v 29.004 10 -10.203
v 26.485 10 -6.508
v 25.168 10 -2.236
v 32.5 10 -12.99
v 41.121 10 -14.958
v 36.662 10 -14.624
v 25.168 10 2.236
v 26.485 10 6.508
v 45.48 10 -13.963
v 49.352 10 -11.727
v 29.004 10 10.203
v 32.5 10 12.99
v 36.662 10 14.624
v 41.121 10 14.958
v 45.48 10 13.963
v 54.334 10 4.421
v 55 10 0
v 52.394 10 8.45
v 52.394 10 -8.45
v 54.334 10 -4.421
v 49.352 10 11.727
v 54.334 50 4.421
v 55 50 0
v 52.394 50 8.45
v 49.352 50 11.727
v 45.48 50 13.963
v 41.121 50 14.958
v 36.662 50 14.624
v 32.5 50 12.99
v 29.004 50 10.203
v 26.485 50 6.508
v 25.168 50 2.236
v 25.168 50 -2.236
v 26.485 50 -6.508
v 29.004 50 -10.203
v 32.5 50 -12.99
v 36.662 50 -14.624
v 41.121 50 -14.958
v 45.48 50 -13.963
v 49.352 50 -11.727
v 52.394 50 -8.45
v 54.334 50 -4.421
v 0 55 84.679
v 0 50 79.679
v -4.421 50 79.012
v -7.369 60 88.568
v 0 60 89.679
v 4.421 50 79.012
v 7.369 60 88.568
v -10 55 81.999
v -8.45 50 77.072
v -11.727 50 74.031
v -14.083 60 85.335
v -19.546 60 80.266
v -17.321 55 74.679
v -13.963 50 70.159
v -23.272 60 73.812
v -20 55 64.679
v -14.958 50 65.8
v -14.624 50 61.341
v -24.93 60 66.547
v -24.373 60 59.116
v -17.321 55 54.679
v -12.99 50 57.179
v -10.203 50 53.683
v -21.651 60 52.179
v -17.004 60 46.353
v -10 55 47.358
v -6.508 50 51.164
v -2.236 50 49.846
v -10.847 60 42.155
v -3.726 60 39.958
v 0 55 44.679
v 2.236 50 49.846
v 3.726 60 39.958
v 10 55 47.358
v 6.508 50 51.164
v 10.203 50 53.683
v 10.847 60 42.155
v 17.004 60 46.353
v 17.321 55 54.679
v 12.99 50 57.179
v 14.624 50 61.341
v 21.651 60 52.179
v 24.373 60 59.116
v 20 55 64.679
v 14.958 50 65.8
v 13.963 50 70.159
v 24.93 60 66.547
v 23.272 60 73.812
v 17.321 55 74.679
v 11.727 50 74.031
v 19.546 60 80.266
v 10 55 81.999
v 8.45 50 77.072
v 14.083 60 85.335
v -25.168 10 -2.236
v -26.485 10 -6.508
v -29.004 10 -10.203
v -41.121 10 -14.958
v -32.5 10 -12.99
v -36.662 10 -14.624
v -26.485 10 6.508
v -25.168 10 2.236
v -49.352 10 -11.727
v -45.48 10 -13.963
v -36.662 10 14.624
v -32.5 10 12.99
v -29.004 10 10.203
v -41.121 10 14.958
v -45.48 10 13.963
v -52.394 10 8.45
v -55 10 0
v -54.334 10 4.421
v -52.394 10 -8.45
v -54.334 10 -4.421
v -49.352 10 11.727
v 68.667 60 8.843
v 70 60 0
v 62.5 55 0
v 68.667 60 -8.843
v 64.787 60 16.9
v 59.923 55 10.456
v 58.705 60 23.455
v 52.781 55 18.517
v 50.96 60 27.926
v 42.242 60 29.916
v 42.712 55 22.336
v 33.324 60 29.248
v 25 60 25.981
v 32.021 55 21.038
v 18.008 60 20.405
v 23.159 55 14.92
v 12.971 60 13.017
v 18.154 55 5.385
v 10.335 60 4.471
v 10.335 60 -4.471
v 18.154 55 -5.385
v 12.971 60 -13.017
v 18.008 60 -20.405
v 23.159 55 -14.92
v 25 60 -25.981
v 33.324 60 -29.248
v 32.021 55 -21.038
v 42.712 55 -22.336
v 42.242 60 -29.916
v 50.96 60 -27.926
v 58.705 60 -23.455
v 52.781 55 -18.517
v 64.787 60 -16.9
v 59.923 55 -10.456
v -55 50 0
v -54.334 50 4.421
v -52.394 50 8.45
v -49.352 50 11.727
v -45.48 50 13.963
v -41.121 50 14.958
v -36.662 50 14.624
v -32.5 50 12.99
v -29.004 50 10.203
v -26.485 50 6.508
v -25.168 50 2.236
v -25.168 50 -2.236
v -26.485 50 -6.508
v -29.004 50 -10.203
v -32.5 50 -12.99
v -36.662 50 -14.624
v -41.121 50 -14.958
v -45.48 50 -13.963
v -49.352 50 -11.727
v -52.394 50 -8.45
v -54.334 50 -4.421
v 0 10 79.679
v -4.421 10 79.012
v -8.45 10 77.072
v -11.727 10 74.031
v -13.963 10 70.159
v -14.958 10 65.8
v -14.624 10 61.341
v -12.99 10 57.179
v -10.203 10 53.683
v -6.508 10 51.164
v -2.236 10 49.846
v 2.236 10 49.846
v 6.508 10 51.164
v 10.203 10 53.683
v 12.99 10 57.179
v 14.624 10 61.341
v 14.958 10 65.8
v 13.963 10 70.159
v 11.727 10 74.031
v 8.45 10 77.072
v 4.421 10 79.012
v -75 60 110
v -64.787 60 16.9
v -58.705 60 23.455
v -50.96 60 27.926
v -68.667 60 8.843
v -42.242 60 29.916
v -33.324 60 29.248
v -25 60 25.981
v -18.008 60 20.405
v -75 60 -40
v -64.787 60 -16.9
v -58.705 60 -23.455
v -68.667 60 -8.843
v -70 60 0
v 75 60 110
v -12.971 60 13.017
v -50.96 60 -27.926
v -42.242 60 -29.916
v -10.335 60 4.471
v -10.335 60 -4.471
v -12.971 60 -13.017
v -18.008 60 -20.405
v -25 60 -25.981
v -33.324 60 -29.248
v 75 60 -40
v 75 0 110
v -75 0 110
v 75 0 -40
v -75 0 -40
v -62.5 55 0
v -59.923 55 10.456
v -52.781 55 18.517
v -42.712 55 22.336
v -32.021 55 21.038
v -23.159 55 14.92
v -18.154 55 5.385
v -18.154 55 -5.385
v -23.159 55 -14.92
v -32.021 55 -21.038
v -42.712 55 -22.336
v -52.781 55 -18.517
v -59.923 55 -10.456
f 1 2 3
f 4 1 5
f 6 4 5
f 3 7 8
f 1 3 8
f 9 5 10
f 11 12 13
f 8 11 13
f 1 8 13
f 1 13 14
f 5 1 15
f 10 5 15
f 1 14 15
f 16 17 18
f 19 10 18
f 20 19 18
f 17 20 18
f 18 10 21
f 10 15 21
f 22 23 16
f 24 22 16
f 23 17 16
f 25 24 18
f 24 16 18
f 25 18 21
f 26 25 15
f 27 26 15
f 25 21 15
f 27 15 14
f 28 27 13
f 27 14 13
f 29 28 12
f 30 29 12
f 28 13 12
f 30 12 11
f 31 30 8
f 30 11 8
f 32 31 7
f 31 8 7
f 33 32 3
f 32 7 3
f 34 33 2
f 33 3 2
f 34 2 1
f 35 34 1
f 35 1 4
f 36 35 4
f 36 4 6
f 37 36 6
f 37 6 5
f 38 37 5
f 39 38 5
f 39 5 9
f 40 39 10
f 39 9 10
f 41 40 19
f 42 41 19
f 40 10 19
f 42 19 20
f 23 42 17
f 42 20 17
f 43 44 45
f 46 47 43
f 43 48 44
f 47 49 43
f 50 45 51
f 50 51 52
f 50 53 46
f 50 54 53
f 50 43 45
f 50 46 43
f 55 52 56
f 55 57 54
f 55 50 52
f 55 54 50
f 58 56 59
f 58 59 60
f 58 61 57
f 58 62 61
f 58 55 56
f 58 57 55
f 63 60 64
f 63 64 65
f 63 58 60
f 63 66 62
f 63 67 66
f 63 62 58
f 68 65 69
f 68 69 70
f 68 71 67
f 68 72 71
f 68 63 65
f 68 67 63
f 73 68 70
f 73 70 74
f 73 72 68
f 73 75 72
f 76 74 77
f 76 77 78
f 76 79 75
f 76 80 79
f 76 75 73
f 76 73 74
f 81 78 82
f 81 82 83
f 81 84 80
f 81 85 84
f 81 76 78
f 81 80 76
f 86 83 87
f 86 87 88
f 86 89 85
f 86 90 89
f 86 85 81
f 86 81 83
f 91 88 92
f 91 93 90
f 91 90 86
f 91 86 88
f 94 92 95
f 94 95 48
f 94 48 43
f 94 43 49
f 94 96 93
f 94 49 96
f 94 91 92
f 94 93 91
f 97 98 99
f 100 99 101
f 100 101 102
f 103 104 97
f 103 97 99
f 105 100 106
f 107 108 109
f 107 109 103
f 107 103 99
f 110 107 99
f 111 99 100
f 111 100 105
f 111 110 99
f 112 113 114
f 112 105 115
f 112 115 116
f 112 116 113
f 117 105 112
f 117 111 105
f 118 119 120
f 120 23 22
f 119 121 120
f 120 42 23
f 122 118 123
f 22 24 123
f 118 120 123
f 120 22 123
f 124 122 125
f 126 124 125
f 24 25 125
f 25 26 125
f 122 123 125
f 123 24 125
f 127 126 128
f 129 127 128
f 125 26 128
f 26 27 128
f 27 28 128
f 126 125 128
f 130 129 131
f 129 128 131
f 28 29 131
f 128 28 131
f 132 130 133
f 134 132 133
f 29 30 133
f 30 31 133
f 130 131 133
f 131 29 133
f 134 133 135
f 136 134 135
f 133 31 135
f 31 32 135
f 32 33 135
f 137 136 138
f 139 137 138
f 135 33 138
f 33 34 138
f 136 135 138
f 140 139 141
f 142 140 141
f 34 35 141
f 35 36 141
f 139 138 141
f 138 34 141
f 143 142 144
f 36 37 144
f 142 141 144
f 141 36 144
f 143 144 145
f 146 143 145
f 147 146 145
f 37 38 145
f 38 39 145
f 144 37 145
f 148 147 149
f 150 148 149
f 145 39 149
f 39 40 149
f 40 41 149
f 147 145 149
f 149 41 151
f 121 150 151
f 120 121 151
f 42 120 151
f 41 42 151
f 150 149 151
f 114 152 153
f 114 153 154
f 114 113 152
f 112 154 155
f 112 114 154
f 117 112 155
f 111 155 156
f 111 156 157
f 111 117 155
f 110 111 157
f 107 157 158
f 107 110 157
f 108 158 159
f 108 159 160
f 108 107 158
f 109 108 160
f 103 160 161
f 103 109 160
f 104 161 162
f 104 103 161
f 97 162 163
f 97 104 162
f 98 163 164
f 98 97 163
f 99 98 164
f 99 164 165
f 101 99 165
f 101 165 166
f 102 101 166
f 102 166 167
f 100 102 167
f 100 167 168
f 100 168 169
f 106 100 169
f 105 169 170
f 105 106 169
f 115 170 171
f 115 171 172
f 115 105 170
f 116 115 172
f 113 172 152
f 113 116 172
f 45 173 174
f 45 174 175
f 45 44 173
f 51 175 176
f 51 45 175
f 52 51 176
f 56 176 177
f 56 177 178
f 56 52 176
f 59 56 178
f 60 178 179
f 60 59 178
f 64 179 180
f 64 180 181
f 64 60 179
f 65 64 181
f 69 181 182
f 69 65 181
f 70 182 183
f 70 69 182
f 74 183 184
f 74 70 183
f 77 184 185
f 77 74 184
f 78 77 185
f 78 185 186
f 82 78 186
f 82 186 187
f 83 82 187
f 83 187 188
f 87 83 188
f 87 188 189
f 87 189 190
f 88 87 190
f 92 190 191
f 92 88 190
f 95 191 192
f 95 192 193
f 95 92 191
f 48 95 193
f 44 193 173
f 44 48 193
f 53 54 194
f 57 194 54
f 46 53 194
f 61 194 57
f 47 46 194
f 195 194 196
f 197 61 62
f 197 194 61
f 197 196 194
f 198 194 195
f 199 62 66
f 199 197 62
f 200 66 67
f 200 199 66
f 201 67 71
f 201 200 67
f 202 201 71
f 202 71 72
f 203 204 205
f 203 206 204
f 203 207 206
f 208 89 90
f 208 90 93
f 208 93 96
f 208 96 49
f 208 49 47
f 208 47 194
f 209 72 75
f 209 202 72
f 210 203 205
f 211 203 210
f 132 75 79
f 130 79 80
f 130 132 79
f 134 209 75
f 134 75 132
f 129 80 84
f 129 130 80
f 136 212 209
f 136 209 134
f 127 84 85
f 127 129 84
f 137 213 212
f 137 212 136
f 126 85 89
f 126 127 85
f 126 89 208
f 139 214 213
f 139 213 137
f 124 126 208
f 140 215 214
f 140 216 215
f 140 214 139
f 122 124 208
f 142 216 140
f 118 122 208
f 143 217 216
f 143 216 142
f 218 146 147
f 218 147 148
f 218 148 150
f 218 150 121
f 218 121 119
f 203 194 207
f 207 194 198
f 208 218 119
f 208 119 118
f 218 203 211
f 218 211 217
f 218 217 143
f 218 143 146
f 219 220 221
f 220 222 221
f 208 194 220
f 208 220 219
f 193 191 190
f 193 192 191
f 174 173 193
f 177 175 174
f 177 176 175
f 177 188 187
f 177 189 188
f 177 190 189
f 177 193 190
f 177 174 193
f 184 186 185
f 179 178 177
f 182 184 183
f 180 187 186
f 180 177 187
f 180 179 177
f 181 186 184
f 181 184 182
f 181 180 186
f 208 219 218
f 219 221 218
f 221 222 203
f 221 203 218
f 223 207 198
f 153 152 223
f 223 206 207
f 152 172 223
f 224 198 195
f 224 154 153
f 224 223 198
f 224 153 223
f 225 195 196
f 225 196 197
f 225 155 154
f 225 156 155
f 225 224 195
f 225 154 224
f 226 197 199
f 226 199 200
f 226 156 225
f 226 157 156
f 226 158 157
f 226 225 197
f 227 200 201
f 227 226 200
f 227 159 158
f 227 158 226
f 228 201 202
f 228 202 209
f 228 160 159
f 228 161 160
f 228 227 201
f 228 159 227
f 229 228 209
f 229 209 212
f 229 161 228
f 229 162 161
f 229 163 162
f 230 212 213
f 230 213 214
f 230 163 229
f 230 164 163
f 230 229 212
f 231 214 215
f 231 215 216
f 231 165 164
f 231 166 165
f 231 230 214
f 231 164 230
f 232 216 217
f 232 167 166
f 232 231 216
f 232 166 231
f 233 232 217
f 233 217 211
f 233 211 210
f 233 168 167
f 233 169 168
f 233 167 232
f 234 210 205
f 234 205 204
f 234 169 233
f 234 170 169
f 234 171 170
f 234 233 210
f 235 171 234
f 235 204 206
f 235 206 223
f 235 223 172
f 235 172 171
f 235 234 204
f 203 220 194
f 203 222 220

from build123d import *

# Parameters (mm, degrees)
SKETCH1_W           = 150
SKETCH1_H           = 80
BOSS_EXTRUDE1_DEPTH = 60
SKETCH3_W           = 150
SKETCH3_H           = 60
BOSS_EXTRUDE2_DEPTH = 70


with BuildPart() as part:
    # Sketch1 → Boss-Extrude1 (new body)
    with BuildSketch(Plane(origin=(0, 0, 0), x_dir=(1, 0, 0), z_dir=(0, 1, 0))):
        Rectangle(SKETCH1_W, SKETCH1_H)
    extrude(amount=BOSS_EXTRUDE1_DEPTH)

    # Sketch2 → Cut-Revolve1 (revolve, cut)
    with BuildSketch(Plane.XY):
        Polygon((-40, 60), (-70, 60), (-55, 50), (-55, 10), (-40, 10), align=None)
    cut_revolve1 = revolve(axis=Axis((-40, 10, 0), (0, 1, 0)), mode=Mode.SUBTRACT)

    # Mirror1: Cut-Revolve1 across plane
    add(cut_revolve1.mirror(Plane(origin=(0, 0, 0), x_dir=(0, 0, 1), z_dir=(1, 0, 0))), mode=Mode.SUBTRACT)

    # Sketch3 → Boss-Extrude2 (add)
    with BuildSketch(Plane.XY.offset(40)):
        with Locations((0, 30)):
            Rectangle(SKETCH3_W, SKETCH3_H)
    extrude(amount=BOSS_EXTRUDE2_DEPTH)

    # Sketch6 → Cut-Revolve2 (revolve, cut)
    with BuildSketch(Plane(origin=(0, 0, 0), x_dir=(0, 0, -1), z_dir=(1, 0, 0))):
        Polygon((-64.678891041, 60), (-64.678891041, 10), (-79.678891041, 10), (-79.678891041, 50), (-89.678891041, 60), align=None)
    revolve(axis=Axis((0, 60, 64.678891041), (0, -1, 0)), mode=Mode.SUBTRACT)


solid = part.part
